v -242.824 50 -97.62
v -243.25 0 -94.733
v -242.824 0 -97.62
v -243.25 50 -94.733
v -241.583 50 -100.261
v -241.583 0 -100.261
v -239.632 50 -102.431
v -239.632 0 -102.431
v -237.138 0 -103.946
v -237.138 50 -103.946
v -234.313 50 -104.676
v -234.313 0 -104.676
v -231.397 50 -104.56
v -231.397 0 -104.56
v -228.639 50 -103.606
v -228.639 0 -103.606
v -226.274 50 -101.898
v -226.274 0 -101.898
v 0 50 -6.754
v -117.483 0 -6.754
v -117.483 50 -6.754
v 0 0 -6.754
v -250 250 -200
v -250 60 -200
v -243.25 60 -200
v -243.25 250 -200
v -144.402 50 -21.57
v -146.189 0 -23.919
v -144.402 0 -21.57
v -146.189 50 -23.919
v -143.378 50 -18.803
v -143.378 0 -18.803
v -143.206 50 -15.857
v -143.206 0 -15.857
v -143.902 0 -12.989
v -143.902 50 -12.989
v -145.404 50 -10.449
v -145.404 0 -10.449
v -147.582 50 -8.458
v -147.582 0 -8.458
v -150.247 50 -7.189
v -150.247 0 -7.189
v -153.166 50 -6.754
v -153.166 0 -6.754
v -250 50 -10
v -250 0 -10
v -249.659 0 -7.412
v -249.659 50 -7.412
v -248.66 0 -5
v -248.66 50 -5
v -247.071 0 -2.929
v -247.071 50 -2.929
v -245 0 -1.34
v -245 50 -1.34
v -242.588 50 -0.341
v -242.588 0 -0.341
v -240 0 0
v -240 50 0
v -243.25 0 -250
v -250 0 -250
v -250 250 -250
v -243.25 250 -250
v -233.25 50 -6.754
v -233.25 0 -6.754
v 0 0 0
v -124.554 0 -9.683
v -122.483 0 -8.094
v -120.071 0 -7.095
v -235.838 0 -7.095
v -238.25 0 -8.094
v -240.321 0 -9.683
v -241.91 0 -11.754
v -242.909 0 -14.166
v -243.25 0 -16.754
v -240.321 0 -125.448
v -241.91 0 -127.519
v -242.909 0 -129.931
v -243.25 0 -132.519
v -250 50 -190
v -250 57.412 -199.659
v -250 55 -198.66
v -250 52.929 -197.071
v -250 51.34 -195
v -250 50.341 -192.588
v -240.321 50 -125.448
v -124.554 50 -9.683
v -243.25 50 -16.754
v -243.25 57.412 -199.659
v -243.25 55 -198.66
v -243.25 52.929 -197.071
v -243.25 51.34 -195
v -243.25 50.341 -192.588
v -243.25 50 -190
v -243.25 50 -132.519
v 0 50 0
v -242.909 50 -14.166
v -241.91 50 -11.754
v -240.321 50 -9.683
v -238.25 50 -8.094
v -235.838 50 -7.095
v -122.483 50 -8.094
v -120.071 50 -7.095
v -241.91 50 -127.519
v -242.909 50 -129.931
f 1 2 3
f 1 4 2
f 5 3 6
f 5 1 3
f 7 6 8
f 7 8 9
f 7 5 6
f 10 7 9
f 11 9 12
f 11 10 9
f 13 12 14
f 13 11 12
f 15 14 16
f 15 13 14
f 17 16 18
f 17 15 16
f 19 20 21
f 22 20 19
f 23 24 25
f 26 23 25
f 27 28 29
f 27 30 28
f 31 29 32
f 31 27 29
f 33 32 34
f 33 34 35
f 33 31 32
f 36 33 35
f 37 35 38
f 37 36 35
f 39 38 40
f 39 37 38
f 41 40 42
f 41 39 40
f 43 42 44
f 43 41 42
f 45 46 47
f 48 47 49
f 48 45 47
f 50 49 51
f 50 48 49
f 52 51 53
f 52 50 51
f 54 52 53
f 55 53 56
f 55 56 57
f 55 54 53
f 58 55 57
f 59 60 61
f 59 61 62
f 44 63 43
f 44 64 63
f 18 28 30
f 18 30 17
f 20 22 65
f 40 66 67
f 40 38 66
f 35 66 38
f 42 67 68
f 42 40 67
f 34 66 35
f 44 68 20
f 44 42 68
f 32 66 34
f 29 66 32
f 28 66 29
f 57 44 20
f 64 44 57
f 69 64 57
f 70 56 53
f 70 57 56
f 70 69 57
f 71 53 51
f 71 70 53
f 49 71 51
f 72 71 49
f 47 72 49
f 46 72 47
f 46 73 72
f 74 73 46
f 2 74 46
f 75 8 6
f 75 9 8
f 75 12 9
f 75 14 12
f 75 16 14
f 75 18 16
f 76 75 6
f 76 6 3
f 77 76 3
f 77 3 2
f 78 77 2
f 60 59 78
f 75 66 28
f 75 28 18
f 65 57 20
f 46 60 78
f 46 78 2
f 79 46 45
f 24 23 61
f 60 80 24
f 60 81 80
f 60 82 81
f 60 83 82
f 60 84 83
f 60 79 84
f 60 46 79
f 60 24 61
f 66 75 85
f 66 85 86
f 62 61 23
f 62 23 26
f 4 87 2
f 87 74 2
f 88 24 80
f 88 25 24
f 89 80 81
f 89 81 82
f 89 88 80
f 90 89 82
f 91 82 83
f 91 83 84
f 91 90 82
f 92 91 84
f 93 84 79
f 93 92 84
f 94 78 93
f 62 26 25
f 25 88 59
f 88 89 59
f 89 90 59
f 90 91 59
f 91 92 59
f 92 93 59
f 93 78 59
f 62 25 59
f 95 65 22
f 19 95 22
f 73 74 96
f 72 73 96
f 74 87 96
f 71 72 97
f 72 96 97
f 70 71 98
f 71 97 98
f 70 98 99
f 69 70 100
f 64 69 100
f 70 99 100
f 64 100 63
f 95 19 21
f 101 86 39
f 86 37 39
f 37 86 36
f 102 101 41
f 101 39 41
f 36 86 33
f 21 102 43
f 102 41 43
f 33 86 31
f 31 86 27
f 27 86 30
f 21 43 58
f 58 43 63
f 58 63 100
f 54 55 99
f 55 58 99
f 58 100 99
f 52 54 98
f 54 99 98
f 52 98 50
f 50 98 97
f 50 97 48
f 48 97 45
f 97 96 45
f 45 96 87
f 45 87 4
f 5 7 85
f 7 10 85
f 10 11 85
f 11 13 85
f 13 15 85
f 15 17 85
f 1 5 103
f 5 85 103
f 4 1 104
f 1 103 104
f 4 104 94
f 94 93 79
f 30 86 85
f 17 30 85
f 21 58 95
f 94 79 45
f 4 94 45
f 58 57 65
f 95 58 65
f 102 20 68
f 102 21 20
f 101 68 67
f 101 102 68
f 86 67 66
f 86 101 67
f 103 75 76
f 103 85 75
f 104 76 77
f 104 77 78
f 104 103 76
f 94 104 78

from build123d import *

# Parameters (mm, degrees)
SKETCH1_W           = 250
SKETCH1_H           = 6.75396212
BOSS_EXTRUDE2_DEPTH = 50
SKETCH2_W           = 6.75
SKETCH2_H           = 250
BOSS_EXTRUDE3_DEPTH = 50
BOSS_EXTRUDE4_DEPTH = 50
FILLET1_R           = 10
FILLET2_R           = 10
FILLET3_R           = 10
FILLET4_R           = 10
FILLET5_R           = 10
FILLET6_R           = 10
SKETCH5_W           = 6.75
SKETCH5_H           = 50
BOSS_EXTRUDE5_DEPTH = 250
FILLET7_R           = 10


with BuildPart() as part:
    # Sketch1 → Boss-Extrude2 (new body)
    with BuildSketch(Plane(origin=(0, 0, 0), x_dir=(1, 0, 0), z_dir=(0, 1, 0))):
        with Locations((-125, 3.37698106)):
            Rectangle(SKETCH1_W, SKETCH1_H)
    extrude(amount=BOSS_EXTRUDE2_DEPTH)

    # Sketch2 → Boss-Extrude3 (add)
    with BuildSketch(Plane(origin=(0, 0, 0), x_dir=(1, 0, 0), z_dir=(0, 1, 0))):
        with Locations((-246.625, 125)):
            Rectangle(SKETCH2_W, SKETCH2_H)
    extrude(amount=BOSS_EXTRUDE3_DEPTH)

    # Sketch3 → Boss-Extrude4 (add)
    with BuildSketch(Plane(origin=(0, 0, 0), x_dir=(1, 0, 0), z_dir=(0, 1, 0))):
        Polygon((-243.25, 128.37698106), (-121.625, 6.75396212), (-121.625, 0), (-250, 125), align=None)
    extrude(amount=BOSS_EXTRUDE4_DEPTH)

    # Fillet1
    fillet1_edges = [part.edges().sort_by_distance(p)[0] for p in [
        (-250, 25, 0),
    ]]
    fillet(fillet1_edges, radius=FILLET1_R)

    # Fillet2
    fillet2_edges = [part.edges().sort_by_distance(p)[0] for p in [
        (-243.25, 25, -6.75396212),
    ]]
    fillet(fillet2_edges, radius=FILLET2_R)

    # Fillet3
    fillet3_edges = [part.edges().sort_by_distance(p)[0] for p in [
        (-243.25, 25, -118.427458617),
    ]]
    fillet(fillet3_edges, radius=FILLET3_R)

    # Fillet4
    fillet4_edges = [part.edges().sort_by_distance(p)[0] for p in [
        (-128.561319097, 25, -6.75396212),
    ]]
    fillet(fillet4_edges, radius=FILLET4_R)

    # Fillet5
    fillet5_edges = [part.edges().sort_by_distance(p)[0] for p in [
        (-121.625, 25, -6.75396212),
    ]]
    fillet(fillet5_edges, radius=FILLET5_R)

    # Fillet6
    fillet6_edges = [part.edges().sort_by_distance(p)[0] for p in [
        (-243.25, 25, -128.37698106),
    ]]
    fillet(fillet6_edges, radius=FILLET6_R)

    # Sketch5 → Boss-Extrude5 (add)
    with BuildSketch(Plane(origin=(0, 0, 0), x_dir=(1, 0, 0), z_dir=(0, 1, 0))):
        with Locations((-246.625, 225)):
            Rectangle(SKETCH5_W, SKETCH5_H)
    extrude(amount=BOSS_EXTRUDE5_DEPTH)

    # Fillet7
    fillet7_edges = [part.edges().sort_by_distance(p)[0] for p in [
        (-246.625, 50, -200),
    ]]
    fillet(fillet7_edges, radius=FILLET7_R)


solid = part.part
